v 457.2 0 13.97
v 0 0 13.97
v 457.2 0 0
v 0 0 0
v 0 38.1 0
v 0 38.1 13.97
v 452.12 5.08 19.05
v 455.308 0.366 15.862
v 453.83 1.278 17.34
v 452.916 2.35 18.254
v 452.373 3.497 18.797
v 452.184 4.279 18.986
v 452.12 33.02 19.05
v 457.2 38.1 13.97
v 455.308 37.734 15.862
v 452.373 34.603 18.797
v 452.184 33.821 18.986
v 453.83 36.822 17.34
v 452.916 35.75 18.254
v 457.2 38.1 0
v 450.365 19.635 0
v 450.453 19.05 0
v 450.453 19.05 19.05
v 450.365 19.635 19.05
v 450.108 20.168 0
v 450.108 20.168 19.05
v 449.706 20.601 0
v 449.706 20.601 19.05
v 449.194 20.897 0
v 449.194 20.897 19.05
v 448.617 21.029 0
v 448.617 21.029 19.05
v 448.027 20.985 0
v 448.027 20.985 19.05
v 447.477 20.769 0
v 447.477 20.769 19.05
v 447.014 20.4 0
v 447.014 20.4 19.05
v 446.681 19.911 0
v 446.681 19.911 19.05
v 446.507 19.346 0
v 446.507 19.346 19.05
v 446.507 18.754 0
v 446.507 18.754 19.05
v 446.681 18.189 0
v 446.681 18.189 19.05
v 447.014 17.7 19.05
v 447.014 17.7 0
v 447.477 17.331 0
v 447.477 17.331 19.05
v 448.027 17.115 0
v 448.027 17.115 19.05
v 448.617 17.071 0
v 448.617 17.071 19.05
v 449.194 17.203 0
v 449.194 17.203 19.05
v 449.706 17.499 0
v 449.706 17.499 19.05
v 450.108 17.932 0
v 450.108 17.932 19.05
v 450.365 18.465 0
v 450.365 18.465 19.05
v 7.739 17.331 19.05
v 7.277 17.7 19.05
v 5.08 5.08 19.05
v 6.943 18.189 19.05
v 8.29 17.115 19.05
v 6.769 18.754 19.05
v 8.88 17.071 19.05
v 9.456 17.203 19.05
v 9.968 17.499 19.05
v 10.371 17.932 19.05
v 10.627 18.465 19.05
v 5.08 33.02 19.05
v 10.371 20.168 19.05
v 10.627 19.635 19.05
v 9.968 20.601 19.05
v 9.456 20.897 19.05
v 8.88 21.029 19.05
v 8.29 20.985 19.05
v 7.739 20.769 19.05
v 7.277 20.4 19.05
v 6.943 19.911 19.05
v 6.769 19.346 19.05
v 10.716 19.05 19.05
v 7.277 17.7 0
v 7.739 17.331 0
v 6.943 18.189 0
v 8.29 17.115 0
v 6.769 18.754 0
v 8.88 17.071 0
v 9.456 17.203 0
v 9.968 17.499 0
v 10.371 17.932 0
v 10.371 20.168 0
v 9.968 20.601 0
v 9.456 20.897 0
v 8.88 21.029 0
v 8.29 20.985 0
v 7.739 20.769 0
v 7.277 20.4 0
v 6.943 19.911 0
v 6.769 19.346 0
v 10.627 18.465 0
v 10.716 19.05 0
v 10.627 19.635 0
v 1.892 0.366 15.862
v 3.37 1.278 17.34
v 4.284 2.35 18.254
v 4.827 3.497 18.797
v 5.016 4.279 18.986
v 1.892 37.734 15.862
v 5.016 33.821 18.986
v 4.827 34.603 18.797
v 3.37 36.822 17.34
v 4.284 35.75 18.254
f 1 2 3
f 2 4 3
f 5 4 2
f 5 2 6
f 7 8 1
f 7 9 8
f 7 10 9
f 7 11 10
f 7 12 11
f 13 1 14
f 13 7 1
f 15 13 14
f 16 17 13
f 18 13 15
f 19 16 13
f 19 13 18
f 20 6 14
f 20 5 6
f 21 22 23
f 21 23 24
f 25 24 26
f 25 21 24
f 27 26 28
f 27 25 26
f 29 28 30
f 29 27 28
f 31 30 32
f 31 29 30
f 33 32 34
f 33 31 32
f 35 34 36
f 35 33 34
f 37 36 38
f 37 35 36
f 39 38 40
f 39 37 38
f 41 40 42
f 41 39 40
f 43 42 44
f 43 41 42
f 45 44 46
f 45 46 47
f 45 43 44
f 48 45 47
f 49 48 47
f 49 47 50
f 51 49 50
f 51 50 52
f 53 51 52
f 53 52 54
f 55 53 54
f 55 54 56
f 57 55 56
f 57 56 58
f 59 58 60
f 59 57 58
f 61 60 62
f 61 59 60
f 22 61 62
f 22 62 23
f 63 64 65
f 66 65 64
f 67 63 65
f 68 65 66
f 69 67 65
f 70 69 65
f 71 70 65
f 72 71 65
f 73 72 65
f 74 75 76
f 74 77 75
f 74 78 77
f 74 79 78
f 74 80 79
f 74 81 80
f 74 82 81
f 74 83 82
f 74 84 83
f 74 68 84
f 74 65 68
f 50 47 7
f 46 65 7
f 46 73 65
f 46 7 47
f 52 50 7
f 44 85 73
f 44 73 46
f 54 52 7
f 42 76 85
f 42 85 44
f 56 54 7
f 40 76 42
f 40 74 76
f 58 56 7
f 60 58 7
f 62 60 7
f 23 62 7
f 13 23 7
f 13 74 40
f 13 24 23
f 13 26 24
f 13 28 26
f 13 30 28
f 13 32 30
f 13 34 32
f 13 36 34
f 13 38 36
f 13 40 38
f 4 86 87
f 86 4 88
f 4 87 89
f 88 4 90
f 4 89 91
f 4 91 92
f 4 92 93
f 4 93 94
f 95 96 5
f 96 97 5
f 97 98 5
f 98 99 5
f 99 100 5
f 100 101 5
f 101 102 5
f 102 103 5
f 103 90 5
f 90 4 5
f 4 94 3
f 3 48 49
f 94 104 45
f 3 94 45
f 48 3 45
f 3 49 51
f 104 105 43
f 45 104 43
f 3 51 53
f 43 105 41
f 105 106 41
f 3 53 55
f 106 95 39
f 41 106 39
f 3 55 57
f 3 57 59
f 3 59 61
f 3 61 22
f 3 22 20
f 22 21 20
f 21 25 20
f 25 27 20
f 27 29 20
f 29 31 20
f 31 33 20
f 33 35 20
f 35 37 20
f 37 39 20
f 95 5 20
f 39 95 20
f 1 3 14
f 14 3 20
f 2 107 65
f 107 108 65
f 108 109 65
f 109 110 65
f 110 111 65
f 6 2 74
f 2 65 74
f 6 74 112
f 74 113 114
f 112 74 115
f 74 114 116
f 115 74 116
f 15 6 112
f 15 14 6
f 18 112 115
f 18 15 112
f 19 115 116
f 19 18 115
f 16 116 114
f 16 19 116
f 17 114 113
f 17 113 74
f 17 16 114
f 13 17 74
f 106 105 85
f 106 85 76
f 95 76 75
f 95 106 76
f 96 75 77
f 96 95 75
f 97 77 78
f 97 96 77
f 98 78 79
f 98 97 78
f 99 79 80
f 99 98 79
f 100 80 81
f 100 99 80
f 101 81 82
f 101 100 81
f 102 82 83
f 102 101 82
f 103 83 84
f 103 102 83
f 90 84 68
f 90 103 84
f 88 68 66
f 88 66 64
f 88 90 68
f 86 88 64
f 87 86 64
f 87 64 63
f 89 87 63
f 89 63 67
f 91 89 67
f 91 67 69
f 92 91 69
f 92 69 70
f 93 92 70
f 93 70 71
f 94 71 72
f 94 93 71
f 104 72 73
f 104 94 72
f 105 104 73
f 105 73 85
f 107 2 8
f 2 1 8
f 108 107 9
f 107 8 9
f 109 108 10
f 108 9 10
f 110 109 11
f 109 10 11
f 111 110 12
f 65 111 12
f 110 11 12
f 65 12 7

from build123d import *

# Parameters (mm, degrees)
F0_W     = 457.2
F0_H     = 38.1
F0_R     = 1.984375
F1_DEPTH = 19.05
F2_SIZE  = 5.08
F3_R     = 5.08


with BuildPart() as f1:
    # F0 (on Top) → F1 (new body)
    with BuildSketch(Plane.XY):
        with Locations((228.6, 19.05)):
            Rectangle(F0_W, F0_H)
        with Locations((8.73125, 19.05)):
            Circle(F0_R, mode=Mode.SUBTRACT)
        with Locations((448.46875, 19.05)):
            Circle(F0_R, mode=Mode.SUBTRACT)
    extrude(amount=F1_DEPTH)

    # F2
    f2_edges = [f1.edges().sort_by_distance(p)[0] for p in [
        (0, 19.05, 19.05),
        (457.2, 19.05, 19.05),
    ]]
    chamfer(f2_edges, length=F2_SIZE)

    # F3
    f3_edges = [f1.edges().sort_by_distance(p)[0] for p in [
        (228.6, 38.1, 19.05),
        (228.6, 0, 19.05),
    ]]
    fillet(f3_edges, radius=F3_R)


solid = f1.part
